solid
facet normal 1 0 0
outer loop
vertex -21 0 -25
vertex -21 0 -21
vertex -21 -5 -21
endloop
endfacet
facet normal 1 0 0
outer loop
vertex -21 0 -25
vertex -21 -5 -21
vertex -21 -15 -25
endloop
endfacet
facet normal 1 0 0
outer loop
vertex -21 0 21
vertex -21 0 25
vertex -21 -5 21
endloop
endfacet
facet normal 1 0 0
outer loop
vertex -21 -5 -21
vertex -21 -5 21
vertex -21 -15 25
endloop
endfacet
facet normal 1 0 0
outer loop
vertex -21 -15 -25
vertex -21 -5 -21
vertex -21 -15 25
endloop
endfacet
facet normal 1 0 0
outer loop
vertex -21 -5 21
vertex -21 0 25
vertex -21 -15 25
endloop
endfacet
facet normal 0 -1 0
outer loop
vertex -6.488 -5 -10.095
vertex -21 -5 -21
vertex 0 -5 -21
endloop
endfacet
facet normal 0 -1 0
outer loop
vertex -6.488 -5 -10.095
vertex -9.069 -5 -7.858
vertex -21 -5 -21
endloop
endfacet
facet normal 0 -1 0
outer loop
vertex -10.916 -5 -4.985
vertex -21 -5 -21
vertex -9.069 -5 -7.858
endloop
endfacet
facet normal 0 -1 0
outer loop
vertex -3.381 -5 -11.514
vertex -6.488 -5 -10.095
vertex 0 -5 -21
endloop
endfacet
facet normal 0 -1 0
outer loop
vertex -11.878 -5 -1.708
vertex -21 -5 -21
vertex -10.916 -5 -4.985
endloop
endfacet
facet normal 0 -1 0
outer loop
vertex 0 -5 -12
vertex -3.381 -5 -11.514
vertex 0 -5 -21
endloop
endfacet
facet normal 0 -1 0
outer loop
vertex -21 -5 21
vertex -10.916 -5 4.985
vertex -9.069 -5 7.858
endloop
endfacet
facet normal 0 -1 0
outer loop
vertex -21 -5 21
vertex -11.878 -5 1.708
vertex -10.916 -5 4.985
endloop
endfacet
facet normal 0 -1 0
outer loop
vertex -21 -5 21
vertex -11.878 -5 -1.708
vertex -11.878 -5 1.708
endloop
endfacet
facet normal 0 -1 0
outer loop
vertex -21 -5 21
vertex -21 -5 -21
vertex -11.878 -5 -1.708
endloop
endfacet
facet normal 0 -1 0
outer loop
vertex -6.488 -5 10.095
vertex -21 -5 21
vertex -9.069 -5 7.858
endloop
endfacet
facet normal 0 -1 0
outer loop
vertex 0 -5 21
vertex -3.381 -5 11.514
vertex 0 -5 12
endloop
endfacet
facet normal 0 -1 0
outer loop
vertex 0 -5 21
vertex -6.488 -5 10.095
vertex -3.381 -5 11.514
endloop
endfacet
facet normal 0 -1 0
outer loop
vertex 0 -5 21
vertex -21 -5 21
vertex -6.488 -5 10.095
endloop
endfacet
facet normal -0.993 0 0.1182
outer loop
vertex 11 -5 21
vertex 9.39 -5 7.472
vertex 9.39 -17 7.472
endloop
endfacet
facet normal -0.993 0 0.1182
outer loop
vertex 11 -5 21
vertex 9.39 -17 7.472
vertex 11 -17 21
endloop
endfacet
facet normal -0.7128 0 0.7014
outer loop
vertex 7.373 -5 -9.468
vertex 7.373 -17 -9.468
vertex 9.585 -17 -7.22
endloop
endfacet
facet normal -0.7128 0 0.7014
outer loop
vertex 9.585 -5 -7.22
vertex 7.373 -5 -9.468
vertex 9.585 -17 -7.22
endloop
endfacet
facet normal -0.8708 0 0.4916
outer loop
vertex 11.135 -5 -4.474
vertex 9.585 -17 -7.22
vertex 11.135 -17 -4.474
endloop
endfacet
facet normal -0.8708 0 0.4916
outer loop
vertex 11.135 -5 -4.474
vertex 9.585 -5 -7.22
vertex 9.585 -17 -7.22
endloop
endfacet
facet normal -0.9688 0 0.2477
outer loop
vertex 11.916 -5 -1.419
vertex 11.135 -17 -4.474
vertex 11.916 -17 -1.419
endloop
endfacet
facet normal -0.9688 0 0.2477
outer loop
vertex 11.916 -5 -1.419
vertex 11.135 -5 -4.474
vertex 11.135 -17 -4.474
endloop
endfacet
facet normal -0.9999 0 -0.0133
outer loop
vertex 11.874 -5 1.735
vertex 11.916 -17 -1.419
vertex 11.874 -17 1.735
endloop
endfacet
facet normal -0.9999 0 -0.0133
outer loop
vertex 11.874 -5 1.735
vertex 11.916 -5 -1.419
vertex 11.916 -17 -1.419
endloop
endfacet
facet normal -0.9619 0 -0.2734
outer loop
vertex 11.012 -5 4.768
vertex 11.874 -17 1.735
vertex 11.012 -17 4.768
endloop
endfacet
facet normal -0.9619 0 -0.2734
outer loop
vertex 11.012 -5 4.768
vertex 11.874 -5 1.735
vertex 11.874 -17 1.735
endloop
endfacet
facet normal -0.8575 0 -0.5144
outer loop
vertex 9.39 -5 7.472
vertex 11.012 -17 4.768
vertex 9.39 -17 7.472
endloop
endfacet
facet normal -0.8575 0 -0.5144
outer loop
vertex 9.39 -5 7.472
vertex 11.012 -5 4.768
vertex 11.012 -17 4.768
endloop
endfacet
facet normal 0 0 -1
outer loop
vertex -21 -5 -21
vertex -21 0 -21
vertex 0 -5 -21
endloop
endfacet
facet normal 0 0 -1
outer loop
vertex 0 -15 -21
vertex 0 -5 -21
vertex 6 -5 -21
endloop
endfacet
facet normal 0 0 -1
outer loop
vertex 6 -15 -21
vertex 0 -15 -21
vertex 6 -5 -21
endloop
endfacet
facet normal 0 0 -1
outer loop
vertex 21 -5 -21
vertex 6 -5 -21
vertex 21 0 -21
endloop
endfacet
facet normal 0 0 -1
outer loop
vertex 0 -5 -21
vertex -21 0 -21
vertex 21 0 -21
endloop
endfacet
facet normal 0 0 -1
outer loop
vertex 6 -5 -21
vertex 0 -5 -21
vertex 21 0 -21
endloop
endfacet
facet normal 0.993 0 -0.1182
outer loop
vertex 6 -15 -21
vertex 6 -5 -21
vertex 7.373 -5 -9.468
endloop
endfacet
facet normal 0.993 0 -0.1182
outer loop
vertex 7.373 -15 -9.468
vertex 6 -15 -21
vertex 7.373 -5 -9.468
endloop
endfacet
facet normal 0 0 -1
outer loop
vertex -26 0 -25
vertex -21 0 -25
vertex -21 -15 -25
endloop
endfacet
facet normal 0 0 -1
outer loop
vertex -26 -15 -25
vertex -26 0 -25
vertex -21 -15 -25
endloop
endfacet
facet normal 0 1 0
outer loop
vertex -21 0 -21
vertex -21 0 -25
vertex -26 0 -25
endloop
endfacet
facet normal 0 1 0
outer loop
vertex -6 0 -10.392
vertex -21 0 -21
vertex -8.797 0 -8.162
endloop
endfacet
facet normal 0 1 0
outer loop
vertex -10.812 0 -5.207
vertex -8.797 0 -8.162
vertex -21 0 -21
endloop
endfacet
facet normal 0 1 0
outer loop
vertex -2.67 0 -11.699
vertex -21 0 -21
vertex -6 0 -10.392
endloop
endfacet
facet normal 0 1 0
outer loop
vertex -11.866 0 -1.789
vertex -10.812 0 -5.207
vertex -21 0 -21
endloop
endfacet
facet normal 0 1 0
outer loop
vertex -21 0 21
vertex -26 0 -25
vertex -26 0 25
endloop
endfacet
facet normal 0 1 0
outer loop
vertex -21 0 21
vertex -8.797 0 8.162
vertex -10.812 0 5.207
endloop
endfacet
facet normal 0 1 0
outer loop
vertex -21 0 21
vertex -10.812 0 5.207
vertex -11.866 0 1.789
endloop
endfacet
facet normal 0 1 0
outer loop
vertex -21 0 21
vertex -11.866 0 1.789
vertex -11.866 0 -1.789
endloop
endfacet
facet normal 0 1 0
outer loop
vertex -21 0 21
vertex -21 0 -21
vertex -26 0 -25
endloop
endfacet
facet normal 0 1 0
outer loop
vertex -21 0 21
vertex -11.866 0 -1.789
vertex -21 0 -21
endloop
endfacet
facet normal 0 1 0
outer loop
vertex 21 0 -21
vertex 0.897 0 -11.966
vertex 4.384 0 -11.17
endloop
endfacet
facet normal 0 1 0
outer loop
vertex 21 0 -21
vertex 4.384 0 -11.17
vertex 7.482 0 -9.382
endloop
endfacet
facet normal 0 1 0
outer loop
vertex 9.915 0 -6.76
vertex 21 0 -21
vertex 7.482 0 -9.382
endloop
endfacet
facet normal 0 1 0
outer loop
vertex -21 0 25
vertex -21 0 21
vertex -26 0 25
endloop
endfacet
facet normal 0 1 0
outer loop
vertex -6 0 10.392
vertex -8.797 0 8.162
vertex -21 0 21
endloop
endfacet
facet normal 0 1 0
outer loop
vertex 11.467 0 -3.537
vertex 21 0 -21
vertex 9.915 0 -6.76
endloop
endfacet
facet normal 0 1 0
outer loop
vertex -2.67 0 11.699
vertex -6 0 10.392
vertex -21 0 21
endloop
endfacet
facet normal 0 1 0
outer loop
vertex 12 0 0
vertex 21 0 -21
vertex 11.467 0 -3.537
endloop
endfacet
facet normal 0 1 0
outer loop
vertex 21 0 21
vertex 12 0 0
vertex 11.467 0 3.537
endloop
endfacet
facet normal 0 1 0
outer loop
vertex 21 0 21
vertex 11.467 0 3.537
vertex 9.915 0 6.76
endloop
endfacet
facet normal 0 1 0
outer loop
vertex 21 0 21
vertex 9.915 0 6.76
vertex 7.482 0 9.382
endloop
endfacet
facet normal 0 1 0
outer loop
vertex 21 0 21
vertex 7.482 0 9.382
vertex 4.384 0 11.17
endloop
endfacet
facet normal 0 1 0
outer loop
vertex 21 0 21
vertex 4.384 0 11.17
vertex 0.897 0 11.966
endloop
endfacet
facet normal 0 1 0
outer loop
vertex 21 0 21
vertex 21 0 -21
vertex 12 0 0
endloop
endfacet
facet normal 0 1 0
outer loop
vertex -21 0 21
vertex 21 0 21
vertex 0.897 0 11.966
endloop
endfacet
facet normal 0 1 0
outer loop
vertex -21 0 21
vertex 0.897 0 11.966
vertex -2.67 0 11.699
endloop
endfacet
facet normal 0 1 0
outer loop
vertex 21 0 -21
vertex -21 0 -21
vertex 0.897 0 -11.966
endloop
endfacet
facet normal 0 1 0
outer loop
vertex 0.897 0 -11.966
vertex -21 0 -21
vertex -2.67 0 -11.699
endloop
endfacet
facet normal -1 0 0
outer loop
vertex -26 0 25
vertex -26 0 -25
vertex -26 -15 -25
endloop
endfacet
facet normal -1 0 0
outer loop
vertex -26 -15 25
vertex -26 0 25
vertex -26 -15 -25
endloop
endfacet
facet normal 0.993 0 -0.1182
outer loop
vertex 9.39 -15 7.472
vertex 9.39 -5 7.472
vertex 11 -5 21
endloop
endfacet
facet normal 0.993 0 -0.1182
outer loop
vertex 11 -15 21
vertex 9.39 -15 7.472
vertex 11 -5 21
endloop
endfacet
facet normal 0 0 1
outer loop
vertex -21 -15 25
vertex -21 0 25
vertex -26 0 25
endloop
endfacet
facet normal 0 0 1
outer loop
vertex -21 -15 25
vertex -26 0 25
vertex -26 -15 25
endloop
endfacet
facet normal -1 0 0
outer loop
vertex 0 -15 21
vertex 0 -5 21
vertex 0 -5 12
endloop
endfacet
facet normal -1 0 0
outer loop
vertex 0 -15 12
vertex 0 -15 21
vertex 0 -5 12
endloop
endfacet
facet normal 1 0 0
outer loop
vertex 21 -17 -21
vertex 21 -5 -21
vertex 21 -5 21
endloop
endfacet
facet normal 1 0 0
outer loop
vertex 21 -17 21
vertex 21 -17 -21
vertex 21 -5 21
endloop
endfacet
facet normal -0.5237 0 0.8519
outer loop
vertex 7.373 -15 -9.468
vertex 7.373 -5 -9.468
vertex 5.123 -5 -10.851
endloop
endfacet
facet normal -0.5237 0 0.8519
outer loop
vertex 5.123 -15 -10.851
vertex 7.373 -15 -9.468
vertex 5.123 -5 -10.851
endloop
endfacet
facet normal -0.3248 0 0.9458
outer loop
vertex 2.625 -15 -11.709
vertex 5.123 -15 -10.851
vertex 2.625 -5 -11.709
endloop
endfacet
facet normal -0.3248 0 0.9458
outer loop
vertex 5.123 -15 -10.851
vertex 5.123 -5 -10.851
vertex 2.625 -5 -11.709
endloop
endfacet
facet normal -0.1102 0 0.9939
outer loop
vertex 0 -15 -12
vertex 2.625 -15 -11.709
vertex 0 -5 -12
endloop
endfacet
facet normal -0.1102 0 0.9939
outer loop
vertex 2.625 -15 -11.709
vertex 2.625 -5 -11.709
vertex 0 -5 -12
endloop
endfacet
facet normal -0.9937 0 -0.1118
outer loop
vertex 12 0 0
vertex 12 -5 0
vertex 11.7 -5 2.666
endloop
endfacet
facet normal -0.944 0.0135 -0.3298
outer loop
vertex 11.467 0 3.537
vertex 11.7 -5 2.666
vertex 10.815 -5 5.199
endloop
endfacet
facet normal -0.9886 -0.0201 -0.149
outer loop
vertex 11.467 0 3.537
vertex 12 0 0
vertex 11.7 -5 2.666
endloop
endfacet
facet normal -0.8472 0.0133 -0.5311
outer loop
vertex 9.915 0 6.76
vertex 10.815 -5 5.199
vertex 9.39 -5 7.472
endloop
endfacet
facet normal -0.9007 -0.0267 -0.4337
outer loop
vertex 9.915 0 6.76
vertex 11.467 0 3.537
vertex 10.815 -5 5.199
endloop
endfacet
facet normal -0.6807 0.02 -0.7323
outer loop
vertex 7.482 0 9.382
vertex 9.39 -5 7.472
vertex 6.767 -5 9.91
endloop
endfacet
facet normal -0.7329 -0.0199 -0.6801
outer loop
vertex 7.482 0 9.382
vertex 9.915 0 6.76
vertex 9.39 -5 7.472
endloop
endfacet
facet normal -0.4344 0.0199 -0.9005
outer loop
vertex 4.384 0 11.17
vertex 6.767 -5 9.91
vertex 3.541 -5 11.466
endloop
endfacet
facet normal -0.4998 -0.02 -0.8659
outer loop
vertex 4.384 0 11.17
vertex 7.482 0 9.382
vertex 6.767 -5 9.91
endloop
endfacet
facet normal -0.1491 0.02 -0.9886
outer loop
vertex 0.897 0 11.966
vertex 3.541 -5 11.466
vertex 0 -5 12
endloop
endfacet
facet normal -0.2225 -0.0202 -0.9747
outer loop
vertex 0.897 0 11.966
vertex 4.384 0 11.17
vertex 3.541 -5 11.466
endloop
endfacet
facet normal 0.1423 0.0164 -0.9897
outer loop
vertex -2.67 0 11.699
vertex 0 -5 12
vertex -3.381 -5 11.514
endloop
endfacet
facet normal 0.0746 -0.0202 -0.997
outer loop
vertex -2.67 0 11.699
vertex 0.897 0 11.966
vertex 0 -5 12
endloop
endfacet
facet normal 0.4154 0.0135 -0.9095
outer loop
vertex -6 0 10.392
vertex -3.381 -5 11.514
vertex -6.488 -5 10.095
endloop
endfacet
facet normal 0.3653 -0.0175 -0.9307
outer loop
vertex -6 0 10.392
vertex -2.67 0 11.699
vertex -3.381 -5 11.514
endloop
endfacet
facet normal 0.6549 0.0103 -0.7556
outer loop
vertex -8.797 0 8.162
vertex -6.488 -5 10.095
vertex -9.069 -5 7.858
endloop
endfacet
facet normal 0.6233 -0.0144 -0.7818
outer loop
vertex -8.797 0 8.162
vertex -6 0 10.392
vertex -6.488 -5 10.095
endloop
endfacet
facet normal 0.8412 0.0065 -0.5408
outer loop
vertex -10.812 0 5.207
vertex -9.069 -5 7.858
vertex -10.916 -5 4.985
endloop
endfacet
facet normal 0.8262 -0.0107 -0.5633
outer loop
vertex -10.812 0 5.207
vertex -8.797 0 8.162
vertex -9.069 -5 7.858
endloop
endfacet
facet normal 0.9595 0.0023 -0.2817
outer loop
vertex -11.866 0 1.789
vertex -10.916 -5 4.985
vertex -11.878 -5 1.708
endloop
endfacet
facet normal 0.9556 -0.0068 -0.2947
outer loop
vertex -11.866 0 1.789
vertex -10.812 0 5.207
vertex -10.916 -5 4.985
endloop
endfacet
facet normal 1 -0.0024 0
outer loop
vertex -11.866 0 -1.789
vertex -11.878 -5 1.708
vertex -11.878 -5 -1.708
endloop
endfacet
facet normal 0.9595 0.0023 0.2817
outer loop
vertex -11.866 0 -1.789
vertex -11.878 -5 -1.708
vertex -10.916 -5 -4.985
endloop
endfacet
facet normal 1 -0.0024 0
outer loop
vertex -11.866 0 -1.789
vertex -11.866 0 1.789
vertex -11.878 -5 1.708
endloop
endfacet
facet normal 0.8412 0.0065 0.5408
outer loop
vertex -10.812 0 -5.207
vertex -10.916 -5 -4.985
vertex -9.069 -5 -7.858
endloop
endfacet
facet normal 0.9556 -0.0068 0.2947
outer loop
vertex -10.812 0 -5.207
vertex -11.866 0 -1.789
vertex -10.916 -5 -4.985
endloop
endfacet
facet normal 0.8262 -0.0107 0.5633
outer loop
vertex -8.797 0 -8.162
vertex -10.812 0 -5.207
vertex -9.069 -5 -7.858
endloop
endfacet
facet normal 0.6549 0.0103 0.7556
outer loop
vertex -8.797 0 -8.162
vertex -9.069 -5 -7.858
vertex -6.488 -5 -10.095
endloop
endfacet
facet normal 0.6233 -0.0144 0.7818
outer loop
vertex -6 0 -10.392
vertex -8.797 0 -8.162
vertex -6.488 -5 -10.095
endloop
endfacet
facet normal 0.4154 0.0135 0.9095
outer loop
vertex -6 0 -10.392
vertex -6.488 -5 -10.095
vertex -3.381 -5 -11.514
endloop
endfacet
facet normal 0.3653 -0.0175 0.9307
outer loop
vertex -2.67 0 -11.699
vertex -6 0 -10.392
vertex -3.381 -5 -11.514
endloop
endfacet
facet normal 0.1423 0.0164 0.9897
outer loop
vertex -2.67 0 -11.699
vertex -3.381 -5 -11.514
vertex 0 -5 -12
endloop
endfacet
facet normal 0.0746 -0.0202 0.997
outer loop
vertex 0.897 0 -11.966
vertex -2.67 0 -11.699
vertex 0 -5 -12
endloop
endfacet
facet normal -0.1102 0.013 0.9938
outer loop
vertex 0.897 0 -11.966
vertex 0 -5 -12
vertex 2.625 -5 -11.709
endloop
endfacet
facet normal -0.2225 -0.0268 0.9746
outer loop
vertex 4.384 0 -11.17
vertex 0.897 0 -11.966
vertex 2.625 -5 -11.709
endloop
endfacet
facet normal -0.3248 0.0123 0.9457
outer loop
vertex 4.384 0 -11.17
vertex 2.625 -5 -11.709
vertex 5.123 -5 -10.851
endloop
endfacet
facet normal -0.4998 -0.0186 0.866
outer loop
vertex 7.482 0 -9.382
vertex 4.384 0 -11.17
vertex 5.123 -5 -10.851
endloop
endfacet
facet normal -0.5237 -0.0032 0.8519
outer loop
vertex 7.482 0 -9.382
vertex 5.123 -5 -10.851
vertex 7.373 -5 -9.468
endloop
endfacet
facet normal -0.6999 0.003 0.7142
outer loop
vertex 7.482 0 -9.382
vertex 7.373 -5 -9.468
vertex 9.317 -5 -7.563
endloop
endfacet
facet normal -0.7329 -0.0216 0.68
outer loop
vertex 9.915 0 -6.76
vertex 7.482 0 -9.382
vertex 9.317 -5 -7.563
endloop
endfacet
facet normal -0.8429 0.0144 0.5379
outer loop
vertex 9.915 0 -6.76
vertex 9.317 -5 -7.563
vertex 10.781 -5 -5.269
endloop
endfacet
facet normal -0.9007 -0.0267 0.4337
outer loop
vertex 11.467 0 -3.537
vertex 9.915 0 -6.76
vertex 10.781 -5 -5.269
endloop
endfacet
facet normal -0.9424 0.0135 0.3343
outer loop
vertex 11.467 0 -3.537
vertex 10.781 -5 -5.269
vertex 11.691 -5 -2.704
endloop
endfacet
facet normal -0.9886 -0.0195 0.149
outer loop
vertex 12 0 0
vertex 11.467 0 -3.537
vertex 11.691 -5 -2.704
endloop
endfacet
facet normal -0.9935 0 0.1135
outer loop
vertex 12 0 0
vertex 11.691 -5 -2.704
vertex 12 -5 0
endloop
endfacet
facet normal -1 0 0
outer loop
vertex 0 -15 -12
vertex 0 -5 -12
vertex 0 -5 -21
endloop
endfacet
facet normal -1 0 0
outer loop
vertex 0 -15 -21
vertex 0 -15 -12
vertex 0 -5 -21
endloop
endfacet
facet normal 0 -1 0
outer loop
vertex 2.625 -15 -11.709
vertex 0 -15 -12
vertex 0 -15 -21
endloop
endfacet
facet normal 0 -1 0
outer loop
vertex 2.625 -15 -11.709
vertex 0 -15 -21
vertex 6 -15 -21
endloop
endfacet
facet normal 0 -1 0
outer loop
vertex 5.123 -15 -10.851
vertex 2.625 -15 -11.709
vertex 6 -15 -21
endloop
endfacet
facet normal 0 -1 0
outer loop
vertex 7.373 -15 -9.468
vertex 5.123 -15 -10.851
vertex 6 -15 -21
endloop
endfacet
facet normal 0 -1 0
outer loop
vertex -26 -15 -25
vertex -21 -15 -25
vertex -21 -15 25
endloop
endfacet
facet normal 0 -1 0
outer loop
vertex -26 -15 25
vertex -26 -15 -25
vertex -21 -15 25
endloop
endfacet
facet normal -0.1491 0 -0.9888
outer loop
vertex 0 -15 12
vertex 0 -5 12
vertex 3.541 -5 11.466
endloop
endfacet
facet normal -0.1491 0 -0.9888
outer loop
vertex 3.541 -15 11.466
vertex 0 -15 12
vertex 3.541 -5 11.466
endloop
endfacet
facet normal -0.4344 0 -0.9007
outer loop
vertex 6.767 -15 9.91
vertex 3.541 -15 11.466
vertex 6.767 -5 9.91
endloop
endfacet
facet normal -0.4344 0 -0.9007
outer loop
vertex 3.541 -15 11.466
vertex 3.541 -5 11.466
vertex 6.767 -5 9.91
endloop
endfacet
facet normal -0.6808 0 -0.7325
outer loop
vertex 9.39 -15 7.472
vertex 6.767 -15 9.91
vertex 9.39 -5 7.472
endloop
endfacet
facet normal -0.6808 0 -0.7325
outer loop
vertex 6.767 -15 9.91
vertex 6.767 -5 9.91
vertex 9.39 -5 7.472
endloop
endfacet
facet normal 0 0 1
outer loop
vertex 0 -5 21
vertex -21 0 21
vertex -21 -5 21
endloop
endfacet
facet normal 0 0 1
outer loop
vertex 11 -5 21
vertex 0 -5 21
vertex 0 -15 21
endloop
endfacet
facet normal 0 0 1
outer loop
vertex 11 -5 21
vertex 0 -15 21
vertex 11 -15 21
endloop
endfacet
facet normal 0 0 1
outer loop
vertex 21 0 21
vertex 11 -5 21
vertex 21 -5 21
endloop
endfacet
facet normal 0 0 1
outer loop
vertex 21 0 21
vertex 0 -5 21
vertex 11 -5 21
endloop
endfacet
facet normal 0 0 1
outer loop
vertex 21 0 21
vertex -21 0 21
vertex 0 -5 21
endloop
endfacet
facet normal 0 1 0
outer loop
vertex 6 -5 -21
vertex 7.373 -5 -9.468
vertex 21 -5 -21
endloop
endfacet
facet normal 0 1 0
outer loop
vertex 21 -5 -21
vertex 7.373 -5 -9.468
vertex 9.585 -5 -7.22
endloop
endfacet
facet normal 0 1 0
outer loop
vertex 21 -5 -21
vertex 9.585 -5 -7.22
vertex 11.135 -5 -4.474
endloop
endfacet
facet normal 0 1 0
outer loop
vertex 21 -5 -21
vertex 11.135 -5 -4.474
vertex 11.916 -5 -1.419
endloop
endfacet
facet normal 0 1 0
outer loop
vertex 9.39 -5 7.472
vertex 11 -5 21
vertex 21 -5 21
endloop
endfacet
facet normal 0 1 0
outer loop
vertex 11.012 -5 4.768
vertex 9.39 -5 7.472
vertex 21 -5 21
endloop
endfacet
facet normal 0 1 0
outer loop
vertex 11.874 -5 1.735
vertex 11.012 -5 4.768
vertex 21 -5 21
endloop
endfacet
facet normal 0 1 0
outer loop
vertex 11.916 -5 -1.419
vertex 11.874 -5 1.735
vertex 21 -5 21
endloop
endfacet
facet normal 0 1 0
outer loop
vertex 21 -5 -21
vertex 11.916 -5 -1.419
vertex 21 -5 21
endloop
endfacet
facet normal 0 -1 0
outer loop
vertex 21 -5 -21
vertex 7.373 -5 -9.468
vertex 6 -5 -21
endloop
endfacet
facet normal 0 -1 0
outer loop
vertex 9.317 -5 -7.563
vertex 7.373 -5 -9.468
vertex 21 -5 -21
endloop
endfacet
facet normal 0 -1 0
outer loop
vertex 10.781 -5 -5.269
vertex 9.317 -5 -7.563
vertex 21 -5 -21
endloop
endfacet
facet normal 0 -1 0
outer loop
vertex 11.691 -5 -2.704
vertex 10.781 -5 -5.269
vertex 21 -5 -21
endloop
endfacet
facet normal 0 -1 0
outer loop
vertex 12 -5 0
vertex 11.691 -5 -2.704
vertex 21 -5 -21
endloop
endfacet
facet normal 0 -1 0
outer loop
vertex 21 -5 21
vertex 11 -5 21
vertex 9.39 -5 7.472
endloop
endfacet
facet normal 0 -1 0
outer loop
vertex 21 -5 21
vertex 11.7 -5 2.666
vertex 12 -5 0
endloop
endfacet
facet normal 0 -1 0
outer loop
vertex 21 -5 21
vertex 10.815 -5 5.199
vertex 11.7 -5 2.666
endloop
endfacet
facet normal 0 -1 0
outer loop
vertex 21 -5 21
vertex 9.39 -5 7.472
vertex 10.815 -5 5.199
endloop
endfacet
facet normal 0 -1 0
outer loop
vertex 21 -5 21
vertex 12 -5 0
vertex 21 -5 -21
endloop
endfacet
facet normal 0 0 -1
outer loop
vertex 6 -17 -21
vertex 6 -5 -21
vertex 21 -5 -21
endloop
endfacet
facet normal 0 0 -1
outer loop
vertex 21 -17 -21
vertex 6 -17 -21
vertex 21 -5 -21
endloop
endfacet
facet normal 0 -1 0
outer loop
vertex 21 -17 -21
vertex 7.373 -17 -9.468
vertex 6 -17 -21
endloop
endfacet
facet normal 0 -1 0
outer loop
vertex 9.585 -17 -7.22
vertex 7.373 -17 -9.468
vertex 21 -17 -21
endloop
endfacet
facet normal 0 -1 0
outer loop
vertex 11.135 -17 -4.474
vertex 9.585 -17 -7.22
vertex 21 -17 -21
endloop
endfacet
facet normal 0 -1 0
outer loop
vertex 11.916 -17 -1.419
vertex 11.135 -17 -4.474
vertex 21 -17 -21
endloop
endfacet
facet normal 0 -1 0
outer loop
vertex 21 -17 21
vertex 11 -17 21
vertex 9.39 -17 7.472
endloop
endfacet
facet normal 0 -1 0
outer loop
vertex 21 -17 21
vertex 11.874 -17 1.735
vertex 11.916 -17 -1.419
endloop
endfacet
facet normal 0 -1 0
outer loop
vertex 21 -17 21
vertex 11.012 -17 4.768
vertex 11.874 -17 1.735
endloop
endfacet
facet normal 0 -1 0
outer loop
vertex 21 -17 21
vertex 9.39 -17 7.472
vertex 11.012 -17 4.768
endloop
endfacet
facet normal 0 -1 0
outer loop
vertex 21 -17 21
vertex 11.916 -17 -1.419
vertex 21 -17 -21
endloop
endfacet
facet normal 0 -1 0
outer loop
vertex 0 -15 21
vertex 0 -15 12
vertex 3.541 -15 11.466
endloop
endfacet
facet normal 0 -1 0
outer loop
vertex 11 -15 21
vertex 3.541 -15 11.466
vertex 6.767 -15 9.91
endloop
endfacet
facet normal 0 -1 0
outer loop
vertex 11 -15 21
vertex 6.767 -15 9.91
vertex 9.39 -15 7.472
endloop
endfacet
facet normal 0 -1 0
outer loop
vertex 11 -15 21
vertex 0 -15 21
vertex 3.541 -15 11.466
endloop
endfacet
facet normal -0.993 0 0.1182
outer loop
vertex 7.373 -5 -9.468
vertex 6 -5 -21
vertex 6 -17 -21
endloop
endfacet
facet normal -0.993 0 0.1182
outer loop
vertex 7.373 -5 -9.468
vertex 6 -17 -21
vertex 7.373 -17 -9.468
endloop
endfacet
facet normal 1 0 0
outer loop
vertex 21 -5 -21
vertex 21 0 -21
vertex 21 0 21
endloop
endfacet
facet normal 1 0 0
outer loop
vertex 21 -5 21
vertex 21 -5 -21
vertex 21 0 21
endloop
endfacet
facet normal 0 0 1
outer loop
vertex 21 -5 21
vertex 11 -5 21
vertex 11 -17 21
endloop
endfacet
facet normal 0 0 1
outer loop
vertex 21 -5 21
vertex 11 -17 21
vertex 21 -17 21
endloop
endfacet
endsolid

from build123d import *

# Parameters (mm, degrees)
F0_W     = 42
F0_H     = 42
F0_R     = 12
F1_DEPTH = 5
F2_W     = 15
F2_H     = 50
F3_DEPTH = 5
F5_DEPTH = 10
F6_DEPTH = 12


with BuildPart() as f1:
    # F0 (on Front) → F1 (new body)
    with BuildSketch(Plane.XZ):
        Rectangle(F0_W, F0_H)
        Circle(F0_R, mode=Mode.SUBTRACT)
    extrude(amount=F1_DEPTH)

    # F2 (on face) → F3 (join)
    with BuildSketch(Plane(origin=(-21, 0, 0), x_dir=(0, -1, 0), z_dir=(-1, 0, 0))):
        with Locations((7.5, 0)):
            Rectangle(F2_W, F2_H)
    extrude(amount=F3_DEPTH)

    # F4 (on face) → F5 (join)
    with BuildSketch(Plane.XZ.offset(5)):
        with BuildLine():
            Line((9.3895657925, 7.4723526569), (11, 21))
            Line((11, 21), (0, 21))
            Line((0, 21), (0, 12))
            ThreePointArc((0, 12), (5.2120901814, 10.8089831132), (9.3895657925, 7.4723526569))
        make_face()
        with BuildLine():
            Line((6, -21), (7.3728713232, -9.4678808849))
            ThreePointArc((7.3728713232, -9.4678808849), (3.8977833047, -11.3493297295), (0, -12))
            Line((0, -12), (0, -21))
            Line((0, -21), (6, -21))
        make_face()
    extrude(amount=F5_DEPTH)


with BuildPart() as f6:
    # F6 (new): a face of the model
    f6_faces = [f1.part.faces().sort_by_distance(p)[0] for p in [
        (15.0870554418, -5, -1.4200647771),
    ]]
    extrude(f6_faces, amount=F6_DEPTH)


solid = Compound([f1.part, f6.part])
